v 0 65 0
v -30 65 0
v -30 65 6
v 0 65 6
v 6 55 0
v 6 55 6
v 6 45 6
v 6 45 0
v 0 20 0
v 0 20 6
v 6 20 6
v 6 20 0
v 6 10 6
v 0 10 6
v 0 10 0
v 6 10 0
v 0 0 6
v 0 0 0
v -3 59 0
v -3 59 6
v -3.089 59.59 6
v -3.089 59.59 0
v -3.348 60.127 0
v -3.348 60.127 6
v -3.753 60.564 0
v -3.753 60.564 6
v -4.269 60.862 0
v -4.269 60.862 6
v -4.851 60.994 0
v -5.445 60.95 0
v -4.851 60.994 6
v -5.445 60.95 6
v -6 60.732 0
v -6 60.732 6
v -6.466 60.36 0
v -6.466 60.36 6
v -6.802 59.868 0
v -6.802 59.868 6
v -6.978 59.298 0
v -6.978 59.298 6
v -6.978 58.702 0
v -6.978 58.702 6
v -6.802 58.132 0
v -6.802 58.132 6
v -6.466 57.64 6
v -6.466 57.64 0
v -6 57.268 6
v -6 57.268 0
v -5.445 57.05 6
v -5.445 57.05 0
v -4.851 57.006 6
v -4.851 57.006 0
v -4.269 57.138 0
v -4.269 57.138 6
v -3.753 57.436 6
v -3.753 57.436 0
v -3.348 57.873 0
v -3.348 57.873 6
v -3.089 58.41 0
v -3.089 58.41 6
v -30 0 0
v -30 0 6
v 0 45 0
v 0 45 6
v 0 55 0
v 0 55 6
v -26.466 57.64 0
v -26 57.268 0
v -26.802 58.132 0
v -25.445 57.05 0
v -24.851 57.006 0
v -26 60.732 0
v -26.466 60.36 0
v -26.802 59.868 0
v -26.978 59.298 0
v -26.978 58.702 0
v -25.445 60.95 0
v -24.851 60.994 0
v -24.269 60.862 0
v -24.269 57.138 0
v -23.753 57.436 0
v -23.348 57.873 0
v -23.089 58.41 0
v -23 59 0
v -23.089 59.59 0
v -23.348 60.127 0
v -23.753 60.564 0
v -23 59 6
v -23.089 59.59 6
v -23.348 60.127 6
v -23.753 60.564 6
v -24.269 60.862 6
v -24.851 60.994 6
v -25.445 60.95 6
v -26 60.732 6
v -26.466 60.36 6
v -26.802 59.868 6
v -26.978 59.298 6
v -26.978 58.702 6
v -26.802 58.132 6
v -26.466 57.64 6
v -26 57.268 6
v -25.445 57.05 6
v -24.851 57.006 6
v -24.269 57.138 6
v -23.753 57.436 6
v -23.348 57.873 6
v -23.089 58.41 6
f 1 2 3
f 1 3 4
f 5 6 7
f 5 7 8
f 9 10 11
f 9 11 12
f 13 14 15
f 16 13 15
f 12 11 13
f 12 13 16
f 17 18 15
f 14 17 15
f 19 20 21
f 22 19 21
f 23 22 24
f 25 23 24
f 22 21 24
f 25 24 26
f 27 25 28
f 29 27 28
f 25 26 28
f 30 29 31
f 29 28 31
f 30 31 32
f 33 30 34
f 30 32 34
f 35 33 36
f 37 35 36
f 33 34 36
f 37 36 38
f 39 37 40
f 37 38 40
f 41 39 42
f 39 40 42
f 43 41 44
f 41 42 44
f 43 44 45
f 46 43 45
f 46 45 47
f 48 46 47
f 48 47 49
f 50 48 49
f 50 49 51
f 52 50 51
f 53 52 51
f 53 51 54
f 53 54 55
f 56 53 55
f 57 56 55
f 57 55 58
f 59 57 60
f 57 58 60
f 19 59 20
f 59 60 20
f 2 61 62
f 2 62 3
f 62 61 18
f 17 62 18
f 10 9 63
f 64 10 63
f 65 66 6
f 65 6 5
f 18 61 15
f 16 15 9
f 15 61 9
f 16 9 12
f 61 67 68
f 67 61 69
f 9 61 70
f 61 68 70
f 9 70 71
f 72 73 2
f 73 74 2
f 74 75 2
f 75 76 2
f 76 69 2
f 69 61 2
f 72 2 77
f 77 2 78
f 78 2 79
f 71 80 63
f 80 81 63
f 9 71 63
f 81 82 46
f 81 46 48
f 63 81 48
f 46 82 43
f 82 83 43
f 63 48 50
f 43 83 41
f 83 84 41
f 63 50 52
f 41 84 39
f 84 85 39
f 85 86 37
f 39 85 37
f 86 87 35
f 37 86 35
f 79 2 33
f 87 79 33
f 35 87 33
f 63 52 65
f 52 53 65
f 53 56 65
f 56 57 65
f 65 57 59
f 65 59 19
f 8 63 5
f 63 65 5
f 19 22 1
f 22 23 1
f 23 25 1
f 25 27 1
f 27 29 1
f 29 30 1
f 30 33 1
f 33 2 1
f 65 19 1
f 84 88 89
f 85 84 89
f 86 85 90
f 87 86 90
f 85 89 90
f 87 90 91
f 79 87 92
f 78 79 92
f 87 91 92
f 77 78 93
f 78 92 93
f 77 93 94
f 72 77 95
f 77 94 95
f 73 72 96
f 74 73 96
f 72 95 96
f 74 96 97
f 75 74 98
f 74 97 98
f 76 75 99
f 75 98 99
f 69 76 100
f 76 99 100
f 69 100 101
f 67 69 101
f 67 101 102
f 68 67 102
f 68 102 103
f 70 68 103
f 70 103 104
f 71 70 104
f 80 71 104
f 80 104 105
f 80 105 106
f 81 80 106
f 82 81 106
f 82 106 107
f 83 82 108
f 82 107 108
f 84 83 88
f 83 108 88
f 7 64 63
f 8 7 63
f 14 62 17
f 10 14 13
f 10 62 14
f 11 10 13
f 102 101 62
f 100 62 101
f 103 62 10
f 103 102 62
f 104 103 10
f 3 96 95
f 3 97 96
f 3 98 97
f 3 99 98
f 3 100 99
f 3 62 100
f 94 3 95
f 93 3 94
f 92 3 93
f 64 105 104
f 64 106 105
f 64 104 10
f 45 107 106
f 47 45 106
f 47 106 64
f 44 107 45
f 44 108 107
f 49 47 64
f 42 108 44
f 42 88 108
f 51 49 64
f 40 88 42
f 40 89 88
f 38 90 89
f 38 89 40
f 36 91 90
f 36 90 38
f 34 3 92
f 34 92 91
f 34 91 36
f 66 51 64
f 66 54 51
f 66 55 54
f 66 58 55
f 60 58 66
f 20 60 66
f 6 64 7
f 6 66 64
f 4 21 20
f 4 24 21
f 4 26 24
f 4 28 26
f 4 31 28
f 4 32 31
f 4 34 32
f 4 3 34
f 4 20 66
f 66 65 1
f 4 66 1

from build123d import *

# Parameters (mm, degrees)
ESQUISSE1_W             = 30
ESQUISSE1_H             = 65
BOSS_EXTRU_1_DEPTH      = 6
ESQUISSE2_W             = 6
ESQUISSE2_H             = 10
BOSS_EXTRU_3_DEPTH      = 6
ESQUISSE3_R             = 2
ENL_V_MAT_EXTRU_1_DEPTH = 6


with BuildPart() as part:
    # Esquisse1 → Boss.-Extru.1 (new body)
    with BuildSketch(Plane.XY):
        with Locations((-15, 32.5)):
            Rectangle(ESQUISSE1_W, ESQUISSE1_H)
    extrude(amount=BOSS_EXTRU_1_DEPTH)

    # Esquisse2 → Boss.-Extru.3 (add)
    with BuildSketch(Plane(origin=(0, 0, 0), x_dir=(0, 0, -1), z_dir=(1, 0, 0))):
        with Locations((-3, 15)):
            Rectangle(ESQUISSE2_W, ESQUISSE2_H)
        with Locations((-3, 50)):
            Rectangle(ESQUISSE2_W, ESQUISSE2_H)
    extrude(amount=BOSS_EXTRU_3_DEPTH)

    # Esquisse3 → Enlèv. mat.-Extru.1 (cut)
    with BuildSketch(Plane.XY.offset(6)):
        with Locations((-25, 59)):
            Circle(ESQUISSE3_R)
        with Locations((-5, 59)):
            Circle(ESQUISSE3_R)
    extrude(amount=-ENL_V_MAT_EXTRU_1_DEPTH, mode=Mode.SUBTRACT)


solid = part.part
